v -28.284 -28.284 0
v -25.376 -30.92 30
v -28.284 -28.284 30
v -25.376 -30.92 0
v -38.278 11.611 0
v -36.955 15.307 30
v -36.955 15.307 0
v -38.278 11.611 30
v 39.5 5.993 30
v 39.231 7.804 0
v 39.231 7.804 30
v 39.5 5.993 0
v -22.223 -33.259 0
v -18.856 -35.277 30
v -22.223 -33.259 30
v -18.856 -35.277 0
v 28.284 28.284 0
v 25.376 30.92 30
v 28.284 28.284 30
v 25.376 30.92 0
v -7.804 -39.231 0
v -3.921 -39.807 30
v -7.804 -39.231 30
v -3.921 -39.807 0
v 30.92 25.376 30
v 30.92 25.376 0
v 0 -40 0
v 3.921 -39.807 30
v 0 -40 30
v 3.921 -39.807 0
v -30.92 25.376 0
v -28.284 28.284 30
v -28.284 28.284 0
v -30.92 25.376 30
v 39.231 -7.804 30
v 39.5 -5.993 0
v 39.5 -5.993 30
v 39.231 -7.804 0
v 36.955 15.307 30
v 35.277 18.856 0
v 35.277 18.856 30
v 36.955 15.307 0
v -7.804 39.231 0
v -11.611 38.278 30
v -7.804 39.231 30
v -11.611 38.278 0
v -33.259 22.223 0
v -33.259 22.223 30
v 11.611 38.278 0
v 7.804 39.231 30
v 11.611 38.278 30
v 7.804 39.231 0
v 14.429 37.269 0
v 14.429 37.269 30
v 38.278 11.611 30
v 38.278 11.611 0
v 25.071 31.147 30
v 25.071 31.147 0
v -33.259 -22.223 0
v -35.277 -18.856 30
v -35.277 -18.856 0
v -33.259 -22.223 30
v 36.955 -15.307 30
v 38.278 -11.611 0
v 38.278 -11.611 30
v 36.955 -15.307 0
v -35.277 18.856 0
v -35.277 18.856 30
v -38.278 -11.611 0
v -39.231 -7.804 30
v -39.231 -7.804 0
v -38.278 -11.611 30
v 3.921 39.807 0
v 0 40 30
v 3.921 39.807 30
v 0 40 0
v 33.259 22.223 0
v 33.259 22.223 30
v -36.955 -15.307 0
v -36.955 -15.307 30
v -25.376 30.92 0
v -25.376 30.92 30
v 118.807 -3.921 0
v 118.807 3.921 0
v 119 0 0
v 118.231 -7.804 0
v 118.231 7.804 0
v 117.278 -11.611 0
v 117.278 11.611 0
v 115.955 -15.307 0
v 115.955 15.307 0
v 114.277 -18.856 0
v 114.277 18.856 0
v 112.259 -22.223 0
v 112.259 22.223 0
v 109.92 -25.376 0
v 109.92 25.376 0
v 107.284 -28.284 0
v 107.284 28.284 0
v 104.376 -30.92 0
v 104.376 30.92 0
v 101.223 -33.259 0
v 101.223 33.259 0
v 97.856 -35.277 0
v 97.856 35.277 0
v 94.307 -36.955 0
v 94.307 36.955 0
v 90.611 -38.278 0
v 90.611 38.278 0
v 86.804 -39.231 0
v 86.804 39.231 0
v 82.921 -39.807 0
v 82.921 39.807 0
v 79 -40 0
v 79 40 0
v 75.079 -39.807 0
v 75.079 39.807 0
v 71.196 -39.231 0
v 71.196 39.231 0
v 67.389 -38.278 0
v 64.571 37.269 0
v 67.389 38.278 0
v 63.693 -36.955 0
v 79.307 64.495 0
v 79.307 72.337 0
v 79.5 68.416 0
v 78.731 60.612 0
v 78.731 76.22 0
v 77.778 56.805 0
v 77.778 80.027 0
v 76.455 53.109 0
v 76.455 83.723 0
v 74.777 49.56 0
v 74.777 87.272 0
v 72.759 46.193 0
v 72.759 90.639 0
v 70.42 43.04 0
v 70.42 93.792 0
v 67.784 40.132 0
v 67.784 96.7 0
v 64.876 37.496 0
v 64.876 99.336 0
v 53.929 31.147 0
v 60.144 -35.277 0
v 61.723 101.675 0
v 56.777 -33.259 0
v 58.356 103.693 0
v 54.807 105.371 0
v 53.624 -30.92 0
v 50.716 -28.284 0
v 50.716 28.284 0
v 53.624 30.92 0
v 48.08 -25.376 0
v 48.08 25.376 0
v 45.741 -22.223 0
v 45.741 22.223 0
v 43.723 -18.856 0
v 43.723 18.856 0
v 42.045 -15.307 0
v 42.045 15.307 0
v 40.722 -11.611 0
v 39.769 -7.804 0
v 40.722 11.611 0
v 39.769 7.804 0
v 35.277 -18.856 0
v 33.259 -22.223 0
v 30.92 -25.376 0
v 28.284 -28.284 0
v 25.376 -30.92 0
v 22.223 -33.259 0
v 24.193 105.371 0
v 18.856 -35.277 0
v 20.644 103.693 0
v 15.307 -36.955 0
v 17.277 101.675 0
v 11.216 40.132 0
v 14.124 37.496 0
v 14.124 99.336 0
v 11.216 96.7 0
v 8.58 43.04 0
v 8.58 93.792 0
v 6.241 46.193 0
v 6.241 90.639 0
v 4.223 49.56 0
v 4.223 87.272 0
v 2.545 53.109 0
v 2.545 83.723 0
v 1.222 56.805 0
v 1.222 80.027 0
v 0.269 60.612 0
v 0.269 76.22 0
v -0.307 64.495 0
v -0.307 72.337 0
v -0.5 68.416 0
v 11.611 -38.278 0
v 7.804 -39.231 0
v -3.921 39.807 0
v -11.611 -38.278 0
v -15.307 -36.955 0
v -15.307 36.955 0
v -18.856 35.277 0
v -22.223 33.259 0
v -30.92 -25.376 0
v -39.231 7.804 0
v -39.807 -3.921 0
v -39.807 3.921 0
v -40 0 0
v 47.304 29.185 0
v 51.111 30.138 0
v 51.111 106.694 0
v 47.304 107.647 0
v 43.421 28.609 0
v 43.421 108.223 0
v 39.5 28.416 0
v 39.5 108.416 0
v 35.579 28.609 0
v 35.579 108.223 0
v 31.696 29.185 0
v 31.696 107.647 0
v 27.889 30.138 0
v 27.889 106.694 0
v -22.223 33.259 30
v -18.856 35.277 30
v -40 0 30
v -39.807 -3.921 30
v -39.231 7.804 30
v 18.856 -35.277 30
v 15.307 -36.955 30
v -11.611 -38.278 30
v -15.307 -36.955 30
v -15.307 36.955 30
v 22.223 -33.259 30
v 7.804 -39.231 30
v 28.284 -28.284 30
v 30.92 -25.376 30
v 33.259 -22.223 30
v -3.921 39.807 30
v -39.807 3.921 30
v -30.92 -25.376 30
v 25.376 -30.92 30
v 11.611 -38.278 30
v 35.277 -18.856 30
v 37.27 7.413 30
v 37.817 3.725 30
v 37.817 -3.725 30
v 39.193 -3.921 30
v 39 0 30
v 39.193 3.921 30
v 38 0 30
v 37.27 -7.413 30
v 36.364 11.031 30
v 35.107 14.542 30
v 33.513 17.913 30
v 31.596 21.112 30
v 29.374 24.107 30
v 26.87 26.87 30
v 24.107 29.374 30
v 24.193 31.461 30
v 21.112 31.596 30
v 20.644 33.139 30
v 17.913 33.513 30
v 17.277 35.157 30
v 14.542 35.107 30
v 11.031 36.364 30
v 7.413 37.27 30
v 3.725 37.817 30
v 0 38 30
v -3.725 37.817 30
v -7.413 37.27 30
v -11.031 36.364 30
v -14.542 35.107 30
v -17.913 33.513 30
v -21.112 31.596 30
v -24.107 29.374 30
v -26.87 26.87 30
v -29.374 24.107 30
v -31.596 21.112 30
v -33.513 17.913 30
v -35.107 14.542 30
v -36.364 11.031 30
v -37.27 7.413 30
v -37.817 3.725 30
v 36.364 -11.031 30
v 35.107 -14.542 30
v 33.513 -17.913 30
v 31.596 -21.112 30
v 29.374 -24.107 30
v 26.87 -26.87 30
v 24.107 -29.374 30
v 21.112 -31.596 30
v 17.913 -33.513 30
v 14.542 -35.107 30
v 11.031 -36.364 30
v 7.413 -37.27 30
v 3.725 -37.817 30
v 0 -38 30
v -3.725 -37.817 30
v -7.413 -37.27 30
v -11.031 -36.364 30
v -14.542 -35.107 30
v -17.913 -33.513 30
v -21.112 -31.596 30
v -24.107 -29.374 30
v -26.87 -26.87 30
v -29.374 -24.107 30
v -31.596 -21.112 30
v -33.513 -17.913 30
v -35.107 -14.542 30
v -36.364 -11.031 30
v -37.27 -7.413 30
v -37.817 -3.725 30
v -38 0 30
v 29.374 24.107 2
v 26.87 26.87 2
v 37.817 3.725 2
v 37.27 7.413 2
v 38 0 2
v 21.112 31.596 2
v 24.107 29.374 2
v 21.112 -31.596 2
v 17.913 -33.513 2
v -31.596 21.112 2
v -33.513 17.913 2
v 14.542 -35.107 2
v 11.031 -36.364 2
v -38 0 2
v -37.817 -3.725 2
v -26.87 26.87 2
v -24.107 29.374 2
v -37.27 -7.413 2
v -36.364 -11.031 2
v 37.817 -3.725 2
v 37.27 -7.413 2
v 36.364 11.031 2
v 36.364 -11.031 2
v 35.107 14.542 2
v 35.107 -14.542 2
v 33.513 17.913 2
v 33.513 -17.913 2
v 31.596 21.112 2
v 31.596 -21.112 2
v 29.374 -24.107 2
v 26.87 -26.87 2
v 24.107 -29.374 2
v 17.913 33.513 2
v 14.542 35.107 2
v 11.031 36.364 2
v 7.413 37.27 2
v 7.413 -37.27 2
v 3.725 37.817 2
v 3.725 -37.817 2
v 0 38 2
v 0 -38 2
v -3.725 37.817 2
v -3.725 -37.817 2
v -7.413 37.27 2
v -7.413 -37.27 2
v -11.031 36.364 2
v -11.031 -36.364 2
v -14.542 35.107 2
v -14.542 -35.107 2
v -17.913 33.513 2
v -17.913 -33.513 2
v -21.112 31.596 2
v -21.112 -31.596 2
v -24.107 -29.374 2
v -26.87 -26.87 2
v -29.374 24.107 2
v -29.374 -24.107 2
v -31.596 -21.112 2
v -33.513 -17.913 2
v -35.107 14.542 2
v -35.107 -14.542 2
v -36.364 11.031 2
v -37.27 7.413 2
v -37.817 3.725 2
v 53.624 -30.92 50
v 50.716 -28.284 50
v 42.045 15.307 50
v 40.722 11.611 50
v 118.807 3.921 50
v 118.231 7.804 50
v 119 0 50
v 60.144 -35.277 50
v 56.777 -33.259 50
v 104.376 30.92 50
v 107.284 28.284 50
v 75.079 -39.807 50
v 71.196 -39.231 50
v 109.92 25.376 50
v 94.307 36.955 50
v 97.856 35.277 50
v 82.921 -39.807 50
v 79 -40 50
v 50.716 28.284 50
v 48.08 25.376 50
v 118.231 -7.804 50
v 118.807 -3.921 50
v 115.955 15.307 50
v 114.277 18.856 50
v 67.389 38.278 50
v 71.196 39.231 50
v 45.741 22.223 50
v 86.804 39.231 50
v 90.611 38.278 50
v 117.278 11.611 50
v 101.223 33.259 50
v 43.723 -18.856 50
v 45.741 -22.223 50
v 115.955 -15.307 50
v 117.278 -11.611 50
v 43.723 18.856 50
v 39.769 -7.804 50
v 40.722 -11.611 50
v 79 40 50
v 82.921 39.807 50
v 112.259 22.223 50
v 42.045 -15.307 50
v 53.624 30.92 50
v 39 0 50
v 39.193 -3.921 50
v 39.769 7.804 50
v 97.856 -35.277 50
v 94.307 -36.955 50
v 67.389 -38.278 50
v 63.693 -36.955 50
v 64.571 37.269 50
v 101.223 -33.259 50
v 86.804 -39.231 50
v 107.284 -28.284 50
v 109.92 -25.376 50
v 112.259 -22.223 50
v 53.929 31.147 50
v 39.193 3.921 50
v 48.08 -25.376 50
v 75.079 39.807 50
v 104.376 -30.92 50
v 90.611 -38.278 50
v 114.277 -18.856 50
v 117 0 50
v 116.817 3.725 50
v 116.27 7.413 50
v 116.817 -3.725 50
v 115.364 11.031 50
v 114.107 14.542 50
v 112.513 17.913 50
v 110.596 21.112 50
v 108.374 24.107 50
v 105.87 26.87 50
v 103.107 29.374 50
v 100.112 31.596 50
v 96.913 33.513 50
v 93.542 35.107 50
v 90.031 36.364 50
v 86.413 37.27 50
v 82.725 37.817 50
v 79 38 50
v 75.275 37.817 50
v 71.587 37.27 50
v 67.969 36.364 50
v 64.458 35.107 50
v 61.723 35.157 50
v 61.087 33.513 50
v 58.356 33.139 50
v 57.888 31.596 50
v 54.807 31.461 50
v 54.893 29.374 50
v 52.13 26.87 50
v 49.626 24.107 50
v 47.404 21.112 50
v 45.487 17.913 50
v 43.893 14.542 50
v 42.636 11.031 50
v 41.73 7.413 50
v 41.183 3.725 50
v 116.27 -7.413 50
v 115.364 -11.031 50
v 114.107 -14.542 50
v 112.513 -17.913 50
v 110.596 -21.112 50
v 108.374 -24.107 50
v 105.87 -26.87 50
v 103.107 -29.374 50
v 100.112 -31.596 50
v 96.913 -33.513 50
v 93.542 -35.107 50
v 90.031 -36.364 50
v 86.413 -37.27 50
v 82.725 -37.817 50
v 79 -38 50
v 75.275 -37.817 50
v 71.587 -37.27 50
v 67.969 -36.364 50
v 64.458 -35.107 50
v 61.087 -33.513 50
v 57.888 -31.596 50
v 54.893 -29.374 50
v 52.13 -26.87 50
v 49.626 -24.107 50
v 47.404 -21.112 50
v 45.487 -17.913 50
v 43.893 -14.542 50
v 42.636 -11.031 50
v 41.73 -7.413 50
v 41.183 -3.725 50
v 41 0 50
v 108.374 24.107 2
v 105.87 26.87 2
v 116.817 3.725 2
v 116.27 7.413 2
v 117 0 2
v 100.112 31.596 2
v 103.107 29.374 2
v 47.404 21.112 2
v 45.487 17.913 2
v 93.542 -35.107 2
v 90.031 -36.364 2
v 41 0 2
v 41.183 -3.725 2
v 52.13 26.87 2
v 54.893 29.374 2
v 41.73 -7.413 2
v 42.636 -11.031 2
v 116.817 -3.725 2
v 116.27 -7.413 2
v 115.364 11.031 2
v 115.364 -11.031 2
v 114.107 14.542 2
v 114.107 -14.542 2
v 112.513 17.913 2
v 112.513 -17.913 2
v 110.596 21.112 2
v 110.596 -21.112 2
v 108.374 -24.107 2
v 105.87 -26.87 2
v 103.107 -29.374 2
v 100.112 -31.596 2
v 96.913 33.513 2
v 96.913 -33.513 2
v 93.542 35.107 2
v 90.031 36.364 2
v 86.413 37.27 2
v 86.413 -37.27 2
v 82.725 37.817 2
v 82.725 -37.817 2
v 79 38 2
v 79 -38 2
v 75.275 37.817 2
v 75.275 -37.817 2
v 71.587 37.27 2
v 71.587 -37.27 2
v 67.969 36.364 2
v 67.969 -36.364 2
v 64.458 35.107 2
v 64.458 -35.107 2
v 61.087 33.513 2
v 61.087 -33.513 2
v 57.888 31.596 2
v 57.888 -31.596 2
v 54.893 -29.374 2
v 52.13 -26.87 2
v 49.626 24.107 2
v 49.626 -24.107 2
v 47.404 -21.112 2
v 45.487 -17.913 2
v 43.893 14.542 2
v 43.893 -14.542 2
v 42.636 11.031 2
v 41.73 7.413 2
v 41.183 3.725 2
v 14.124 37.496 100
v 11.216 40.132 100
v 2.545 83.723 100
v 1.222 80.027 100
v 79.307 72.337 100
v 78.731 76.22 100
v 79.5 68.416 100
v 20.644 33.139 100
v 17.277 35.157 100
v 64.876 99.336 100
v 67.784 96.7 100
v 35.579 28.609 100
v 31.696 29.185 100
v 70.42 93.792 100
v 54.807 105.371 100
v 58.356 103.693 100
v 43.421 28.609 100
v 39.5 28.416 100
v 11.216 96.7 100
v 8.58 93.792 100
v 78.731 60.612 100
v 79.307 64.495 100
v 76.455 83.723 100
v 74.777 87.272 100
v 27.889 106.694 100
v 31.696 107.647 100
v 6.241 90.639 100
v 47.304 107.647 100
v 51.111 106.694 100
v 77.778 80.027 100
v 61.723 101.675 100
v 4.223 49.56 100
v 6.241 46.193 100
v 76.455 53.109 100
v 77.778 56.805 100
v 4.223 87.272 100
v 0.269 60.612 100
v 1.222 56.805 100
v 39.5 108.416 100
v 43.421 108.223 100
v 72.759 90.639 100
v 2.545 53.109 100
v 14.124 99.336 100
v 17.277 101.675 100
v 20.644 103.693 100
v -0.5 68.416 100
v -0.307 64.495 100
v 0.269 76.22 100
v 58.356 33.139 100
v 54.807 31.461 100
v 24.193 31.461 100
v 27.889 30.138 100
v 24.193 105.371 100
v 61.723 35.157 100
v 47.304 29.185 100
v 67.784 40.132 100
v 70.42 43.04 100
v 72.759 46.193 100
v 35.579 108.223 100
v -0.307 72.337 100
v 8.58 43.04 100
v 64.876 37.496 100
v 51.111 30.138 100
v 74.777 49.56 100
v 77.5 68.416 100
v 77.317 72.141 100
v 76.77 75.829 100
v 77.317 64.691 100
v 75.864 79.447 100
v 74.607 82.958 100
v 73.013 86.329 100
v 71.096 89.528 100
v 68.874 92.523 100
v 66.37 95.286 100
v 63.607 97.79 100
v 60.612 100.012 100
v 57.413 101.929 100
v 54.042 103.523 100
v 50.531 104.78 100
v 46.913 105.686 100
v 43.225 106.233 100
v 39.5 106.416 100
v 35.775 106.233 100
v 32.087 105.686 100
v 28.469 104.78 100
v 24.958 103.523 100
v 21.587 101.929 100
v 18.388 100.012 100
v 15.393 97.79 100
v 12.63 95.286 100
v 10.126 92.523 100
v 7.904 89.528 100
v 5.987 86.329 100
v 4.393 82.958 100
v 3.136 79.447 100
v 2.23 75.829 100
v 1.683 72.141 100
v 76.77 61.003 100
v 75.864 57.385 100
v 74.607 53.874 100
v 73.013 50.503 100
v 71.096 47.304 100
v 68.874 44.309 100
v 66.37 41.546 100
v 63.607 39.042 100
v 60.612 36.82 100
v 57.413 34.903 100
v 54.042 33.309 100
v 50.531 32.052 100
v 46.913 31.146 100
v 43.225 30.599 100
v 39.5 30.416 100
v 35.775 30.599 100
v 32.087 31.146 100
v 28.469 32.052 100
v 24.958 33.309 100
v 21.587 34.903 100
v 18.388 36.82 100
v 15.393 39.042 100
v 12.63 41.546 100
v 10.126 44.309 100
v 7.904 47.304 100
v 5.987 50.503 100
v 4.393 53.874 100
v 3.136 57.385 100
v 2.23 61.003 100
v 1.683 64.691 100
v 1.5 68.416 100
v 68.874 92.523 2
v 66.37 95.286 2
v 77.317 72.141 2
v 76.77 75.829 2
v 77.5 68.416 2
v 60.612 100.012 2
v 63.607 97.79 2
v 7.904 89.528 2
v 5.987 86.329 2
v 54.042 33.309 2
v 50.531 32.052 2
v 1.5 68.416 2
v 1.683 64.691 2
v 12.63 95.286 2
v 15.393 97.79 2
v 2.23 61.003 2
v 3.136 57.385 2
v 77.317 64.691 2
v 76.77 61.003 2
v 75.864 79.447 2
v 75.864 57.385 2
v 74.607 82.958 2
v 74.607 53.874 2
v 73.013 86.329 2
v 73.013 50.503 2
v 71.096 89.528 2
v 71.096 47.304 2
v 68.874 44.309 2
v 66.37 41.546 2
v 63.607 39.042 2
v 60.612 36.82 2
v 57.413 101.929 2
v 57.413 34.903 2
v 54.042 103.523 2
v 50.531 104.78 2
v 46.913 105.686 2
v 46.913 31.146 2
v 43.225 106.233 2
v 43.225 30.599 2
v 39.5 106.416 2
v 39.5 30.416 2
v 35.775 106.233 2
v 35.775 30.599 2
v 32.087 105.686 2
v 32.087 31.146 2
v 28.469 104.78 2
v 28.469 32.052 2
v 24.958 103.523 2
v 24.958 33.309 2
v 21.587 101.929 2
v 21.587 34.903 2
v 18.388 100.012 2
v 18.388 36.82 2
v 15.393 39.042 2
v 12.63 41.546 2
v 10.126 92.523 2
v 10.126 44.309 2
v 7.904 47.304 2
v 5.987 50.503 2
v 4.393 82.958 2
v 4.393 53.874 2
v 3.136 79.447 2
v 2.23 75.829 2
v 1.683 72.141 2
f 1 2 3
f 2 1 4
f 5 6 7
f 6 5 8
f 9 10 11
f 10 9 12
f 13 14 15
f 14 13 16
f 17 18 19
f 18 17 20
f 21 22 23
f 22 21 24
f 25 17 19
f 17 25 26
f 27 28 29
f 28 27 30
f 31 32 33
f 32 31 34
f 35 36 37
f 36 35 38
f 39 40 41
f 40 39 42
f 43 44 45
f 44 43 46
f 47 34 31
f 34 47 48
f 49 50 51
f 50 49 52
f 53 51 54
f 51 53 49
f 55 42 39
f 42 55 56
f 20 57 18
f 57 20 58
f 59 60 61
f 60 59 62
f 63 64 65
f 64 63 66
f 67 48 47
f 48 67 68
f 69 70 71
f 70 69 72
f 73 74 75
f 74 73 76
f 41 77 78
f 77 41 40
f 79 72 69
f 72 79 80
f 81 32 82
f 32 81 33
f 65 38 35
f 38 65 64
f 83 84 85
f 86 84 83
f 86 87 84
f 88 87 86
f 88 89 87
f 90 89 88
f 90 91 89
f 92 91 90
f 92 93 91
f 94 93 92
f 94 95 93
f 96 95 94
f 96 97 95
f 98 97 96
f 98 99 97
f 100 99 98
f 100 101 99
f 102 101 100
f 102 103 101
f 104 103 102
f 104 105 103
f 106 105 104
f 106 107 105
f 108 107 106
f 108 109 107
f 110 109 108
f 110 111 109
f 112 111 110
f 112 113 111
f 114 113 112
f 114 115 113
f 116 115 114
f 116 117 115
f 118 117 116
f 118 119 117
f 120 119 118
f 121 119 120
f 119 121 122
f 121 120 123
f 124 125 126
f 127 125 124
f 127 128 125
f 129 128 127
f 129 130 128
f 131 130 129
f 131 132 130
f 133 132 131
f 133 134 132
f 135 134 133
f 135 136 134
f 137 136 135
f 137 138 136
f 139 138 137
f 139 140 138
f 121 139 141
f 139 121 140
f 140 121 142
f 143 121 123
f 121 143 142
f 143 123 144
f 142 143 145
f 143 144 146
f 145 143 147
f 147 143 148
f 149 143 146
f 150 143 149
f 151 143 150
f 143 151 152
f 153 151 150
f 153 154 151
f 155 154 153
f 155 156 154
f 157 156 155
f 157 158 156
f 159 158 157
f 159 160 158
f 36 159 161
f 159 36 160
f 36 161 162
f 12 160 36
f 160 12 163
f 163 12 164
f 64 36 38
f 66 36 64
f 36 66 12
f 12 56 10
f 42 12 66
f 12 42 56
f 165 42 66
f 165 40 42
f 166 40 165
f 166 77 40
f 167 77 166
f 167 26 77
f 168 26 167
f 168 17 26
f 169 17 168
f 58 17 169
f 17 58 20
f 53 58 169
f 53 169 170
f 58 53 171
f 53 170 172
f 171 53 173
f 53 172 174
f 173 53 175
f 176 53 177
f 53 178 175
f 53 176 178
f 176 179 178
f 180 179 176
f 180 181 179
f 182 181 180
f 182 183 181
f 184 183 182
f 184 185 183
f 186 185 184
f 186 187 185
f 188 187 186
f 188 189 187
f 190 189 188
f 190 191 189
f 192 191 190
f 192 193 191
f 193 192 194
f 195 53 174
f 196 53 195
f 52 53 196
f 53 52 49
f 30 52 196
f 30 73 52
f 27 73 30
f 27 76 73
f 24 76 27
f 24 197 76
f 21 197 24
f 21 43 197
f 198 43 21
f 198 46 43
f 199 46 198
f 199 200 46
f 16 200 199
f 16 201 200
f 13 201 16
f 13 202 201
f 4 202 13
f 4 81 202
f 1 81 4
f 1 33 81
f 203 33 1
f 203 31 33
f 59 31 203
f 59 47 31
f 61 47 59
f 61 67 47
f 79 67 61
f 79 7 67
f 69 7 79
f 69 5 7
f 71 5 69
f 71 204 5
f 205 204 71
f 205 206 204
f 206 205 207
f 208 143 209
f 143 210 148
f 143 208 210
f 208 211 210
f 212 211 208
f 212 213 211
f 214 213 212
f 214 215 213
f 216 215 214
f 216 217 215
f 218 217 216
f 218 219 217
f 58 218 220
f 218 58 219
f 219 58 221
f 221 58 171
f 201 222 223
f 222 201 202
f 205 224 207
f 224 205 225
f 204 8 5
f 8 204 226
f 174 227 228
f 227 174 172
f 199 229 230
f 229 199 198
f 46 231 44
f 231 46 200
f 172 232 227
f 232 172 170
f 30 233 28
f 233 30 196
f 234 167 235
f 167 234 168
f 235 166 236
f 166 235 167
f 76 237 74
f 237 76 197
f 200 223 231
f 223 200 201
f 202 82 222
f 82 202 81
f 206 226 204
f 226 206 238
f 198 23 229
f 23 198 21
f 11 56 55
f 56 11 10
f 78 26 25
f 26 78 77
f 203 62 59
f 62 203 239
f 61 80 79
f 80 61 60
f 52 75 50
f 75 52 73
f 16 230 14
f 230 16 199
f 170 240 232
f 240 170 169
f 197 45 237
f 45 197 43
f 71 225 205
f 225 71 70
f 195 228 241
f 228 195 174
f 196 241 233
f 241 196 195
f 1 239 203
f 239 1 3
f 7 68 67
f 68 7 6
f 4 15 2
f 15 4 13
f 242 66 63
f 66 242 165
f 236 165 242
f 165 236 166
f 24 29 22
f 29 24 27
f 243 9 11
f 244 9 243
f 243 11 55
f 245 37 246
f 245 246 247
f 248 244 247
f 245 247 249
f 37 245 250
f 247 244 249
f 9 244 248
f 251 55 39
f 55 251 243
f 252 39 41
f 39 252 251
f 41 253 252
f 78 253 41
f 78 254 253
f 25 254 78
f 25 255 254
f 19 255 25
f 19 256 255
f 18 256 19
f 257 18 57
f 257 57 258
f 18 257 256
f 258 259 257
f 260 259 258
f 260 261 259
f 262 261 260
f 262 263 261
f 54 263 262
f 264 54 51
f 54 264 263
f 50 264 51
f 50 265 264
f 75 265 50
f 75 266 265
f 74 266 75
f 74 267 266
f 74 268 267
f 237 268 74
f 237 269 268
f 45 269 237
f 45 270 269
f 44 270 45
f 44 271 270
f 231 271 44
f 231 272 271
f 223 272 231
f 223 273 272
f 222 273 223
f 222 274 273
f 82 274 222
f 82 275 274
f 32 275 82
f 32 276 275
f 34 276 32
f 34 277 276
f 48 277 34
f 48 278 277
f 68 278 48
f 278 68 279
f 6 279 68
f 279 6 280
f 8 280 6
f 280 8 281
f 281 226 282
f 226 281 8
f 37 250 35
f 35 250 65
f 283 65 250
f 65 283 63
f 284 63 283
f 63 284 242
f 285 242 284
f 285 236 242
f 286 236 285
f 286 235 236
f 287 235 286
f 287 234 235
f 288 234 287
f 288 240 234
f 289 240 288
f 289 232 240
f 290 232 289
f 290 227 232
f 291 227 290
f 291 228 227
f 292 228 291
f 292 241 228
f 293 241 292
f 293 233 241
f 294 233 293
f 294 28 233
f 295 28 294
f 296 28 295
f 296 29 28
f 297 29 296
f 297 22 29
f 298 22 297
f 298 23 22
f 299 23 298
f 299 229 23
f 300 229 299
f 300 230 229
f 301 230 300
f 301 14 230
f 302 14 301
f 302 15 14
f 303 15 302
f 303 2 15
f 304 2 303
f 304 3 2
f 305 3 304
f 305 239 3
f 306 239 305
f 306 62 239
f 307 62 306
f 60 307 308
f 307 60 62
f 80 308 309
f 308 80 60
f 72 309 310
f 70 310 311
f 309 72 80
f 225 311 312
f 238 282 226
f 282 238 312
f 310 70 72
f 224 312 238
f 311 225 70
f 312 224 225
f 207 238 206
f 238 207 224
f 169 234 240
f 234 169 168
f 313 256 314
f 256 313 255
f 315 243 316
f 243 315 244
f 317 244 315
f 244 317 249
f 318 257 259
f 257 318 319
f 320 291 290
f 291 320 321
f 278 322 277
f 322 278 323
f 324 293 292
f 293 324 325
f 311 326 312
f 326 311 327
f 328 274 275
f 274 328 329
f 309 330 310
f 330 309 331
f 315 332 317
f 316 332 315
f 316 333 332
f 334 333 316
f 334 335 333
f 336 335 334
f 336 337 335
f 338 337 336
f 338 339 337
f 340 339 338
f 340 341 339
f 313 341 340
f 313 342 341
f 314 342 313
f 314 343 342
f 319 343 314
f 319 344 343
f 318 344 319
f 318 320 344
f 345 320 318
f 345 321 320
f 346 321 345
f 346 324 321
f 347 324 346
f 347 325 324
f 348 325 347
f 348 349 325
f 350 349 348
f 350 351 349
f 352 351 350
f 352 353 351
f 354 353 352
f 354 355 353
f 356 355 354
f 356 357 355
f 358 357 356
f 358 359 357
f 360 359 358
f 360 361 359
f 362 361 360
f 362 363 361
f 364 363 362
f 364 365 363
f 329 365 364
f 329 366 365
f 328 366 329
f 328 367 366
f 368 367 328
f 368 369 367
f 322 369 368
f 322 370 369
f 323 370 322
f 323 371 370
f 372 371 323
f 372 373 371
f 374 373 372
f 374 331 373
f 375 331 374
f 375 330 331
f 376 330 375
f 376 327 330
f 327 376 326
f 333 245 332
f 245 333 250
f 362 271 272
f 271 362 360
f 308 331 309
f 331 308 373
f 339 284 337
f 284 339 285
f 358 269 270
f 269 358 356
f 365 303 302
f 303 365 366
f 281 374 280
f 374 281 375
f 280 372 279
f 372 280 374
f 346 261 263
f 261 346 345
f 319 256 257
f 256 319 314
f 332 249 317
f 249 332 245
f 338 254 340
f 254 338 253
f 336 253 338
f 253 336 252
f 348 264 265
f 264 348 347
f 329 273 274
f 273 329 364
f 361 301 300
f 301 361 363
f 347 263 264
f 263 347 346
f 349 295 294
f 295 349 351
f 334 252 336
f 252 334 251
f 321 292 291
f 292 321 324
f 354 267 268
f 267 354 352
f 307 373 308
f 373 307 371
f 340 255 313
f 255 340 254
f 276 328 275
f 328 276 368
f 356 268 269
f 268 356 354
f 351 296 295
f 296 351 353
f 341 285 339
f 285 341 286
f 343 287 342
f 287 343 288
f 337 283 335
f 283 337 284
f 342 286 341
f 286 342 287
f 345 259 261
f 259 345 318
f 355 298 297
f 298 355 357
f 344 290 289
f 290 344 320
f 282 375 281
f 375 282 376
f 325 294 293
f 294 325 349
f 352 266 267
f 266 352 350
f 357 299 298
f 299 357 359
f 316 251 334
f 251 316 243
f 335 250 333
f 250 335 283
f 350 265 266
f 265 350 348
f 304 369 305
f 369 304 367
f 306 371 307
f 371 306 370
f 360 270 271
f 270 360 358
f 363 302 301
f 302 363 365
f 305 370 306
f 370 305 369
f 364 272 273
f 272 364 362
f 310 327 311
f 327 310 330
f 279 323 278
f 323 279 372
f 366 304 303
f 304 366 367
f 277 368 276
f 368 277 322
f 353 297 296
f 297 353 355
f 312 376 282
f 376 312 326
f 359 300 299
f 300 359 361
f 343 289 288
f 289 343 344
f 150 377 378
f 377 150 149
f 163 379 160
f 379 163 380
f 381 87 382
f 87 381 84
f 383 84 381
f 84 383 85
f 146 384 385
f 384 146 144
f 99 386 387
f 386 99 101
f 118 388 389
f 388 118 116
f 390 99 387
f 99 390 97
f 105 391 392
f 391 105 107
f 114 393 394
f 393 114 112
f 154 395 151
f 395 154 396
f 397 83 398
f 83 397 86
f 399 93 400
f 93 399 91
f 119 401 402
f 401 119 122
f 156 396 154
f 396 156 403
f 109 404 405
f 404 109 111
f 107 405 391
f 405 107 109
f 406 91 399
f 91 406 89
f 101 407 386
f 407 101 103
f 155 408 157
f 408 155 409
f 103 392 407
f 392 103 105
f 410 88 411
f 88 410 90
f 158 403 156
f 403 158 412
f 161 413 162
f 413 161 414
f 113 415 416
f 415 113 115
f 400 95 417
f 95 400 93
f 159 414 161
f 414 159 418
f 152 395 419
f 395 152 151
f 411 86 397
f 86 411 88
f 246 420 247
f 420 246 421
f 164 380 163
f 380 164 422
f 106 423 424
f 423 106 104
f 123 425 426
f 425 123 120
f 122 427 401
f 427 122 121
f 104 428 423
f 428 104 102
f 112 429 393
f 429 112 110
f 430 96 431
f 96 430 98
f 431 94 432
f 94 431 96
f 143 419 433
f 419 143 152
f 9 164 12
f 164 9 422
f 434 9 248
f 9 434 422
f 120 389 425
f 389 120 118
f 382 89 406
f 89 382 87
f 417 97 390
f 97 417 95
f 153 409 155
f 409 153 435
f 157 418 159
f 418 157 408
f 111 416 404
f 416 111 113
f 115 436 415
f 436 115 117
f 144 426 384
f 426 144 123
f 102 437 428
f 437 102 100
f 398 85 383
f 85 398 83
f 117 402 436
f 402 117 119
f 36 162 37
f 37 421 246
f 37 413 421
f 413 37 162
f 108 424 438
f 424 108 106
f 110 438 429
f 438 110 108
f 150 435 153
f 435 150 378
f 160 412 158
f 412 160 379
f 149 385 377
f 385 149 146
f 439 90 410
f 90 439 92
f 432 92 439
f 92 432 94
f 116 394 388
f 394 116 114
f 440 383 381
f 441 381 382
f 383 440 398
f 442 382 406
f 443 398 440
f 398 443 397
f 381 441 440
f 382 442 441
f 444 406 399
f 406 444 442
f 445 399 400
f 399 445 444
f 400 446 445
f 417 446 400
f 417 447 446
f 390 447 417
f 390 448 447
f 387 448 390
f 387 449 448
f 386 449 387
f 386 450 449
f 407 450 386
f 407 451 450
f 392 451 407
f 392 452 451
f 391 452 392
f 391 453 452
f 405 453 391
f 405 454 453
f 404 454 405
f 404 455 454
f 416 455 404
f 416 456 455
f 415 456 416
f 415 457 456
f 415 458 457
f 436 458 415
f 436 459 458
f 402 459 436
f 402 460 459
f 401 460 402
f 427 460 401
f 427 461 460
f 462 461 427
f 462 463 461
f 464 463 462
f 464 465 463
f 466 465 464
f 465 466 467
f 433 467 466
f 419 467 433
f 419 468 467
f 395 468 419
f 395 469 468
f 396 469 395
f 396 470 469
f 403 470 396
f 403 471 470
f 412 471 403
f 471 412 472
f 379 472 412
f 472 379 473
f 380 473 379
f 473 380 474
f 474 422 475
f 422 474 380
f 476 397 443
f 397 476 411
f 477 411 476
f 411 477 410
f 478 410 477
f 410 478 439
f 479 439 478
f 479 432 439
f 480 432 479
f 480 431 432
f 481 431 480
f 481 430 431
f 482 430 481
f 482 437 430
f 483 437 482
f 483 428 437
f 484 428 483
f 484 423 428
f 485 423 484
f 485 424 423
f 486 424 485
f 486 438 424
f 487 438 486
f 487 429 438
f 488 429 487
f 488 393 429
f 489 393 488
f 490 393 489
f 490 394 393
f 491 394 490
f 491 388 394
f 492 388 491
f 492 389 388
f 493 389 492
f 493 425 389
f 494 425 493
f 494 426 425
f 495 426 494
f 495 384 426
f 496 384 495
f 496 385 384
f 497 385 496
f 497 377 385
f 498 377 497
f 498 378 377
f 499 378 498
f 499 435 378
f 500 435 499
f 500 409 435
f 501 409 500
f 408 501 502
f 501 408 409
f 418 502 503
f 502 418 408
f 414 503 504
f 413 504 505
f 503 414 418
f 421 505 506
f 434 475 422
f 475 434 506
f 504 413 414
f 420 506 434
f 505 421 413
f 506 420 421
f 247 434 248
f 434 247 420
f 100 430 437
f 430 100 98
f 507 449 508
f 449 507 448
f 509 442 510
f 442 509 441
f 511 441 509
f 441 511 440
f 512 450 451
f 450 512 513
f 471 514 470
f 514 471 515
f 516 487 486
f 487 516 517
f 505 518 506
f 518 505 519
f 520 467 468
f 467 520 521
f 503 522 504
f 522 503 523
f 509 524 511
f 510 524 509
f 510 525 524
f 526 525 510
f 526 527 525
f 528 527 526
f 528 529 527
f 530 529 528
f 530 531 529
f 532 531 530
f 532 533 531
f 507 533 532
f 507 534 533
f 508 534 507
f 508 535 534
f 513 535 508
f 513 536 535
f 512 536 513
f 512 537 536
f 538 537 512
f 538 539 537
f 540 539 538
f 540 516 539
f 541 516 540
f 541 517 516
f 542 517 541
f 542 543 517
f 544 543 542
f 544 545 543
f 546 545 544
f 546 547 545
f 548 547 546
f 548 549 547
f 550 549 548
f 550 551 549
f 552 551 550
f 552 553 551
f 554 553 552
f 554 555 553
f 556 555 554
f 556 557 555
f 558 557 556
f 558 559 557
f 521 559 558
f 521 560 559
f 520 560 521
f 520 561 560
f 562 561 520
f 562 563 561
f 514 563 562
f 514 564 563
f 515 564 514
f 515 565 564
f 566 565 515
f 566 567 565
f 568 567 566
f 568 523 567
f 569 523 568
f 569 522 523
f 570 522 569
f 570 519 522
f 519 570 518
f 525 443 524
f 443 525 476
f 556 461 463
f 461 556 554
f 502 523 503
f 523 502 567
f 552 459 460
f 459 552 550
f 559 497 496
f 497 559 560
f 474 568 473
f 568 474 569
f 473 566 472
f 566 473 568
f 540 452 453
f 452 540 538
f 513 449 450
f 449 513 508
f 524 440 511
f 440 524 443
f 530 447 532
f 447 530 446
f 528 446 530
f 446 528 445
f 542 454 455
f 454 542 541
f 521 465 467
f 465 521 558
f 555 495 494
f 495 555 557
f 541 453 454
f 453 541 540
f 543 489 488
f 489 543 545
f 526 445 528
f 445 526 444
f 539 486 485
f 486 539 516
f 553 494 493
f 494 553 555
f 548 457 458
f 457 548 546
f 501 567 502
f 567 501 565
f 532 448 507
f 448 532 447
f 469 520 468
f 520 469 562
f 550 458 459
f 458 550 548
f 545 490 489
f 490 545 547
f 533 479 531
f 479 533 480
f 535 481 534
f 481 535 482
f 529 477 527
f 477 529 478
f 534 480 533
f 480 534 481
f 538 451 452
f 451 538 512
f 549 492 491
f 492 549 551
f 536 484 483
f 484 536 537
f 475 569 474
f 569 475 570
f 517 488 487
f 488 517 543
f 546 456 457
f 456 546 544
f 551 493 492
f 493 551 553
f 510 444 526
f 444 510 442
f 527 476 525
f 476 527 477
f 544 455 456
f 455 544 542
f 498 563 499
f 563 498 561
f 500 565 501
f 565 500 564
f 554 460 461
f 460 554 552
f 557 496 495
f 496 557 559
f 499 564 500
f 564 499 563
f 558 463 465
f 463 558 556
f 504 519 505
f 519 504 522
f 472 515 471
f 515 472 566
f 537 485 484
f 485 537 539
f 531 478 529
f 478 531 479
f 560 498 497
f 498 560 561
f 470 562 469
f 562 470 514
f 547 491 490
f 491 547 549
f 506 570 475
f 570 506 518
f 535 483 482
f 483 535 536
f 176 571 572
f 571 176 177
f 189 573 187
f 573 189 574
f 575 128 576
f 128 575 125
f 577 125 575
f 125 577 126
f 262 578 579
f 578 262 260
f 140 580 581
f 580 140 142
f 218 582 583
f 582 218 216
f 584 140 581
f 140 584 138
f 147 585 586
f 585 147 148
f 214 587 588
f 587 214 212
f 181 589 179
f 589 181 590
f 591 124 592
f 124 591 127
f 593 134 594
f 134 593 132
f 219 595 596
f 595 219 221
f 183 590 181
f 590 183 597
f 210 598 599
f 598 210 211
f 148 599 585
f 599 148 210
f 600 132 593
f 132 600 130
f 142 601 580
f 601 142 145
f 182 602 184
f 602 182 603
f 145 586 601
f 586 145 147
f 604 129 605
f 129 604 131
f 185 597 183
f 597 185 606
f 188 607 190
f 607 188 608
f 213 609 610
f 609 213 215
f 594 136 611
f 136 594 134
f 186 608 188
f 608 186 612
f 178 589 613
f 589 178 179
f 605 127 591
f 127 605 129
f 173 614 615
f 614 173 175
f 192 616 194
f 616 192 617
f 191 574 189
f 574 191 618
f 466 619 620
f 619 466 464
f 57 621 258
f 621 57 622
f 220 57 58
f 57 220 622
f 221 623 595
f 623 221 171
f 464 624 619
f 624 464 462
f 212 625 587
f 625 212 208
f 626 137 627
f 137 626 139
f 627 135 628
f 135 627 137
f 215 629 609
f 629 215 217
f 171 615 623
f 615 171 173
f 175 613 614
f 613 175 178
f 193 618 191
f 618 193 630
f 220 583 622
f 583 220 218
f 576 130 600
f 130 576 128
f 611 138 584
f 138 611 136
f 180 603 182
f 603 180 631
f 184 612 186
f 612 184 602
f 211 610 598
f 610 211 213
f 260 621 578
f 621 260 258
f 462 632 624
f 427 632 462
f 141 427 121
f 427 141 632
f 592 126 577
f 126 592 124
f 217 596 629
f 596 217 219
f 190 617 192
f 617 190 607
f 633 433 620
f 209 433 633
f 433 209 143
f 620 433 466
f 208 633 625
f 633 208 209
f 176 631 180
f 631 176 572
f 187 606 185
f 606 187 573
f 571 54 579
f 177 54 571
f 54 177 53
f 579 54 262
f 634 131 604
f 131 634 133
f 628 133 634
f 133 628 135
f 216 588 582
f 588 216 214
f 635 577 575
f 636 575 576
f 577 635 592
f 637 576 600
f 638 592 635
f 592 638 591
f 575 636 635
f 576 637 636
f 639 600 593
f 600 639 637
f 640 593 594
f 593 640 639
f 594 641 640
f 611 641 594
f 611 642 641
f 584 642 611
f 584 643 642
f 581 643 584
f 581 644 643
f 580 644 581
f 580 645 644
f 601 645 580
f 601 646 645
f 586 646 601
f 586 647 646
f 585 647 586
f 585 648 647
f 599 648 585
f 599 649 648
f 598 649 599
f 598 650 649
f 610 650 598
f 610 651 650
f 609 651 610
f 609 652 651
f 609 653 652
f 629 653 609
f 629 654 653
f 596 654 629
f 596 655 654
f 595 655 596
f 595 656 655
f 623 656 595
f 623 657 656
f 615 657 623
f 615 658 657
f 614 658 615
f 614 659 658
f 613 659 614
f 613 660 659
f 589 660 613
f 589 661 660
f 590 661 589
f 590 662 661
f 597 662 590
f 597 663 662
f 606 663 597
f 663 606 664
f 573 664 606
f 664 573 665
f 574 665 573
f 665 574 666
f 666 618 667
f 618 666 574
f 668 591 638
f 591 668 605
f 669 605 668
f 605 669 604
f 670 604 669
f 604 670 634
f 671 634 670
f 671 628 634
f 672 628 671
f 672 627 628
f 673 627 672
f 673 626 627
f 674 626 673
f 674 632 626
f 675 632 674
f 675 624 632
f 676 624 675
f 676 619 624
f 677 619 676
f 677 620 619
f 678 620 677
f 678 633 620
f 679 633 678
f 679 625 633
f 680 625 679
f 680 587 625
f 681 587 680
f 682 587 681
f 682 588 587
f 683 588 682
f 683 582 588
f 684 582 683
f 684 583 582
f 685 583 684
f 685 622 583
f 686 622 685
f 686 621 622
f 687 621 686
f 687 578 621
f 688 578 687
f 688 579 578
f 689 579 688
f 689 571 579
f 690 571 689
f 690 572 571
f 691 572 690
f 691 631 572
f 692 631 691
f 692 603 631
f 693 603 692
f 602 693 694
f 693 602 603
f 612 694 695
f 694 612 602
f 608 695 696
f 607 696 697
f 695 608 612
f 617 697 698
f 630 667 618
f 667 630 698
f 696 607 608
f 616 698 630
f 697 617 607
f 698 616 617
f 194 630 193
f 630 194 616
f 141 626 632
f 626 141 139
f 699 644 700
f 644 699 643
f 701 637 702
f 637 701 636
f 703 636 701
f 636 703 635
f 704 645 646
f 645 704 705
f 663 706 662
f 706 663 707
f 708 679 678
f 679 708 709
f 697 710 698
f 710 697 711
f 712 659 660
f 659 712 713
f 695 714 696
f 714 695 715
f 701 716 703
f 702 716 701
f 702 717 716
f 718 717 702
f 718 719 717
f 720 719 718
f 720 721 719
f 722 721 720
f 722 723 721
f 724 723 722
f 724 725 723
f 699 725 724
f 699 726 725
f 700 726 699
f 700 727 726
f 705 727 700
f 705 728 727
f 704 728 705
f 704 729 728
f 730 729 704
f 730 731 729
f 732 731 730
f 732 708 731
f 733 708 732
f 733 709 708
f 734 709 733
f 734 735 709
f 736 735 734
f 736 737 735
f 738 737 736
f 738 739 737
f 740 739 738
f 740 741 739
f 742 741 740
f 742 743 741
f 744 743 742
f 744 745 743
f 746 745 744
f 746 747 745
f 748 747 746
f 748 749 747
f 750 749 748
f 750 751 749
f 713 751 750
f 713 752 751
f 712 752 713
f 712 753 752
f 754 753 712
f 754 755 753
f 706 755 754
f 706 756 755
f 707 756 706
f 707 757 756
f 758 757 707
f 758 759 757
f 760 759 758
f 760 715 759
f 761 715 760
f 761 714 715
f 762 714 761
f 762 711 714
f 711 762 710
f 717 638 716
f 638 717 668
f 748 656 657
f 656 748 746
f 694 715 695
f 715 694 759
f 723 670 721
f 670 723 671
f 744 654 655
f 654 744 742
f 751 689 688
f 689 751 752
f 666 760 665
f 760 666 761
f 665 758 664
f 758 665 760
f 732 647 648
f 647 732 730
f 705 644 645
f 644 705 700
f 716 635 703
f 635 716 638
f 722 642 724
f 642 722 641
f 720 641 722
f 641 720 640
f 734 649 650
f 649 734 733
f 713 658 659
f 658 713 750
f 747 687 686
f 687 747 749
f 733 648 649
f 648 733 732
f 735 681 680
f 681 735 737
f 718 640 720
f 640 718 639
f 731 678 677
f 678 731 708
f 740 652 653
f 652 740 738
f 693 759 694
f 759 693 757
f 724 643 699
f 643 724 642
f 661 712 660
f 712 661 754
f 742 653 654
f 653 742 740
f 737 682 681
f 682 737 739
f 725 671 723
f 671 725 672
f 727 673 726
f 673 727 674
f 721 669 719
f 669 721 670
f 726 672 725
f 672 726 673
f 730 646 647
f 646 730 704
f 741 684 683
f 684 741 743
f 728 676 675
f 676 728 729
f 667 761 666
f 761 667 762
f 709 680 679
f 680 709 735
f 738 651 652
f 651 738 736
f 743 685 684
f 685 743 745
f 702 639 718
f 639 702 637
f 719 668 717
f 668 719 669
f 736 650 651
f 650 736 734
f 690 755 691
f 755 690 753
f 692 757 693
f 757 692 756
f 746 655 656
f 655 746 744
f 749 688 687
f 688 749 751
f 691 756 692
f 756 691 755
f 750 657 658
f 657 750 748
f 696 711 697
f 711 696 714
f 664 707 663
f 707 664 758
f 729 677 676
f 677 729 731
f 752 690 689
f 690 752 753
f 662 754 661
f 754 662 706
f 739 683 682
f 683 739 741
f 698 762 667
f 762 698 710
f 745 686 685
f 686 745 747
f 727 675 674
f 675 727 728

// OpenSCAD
// Diameter of each of the towers
diameter = 80; // [30:5:100]
// Height of the first tower
height1 = 30; // [30:10:200]
// Height of the second tower
height2 = 50; // [30:10:200]
// Height of the third tower
height3 = 100; // [30:10:200]

PencilHolder(height1, height2, height3);

module Container(height) {
    $fn=64;
    difference() {
        cylinder(h=height, d=diameter);
        translate([0, 0, 2]) cylinder(h=height, d=diameter-4);
    }
}

module PencilHolder(height1 = 100, height2 = 50, height3 = 30) {
    Container(height1);
    translate([diameter-1,0,0]) Container(height2);
    translate([(diameter-1)/2,(diameter-1)*sin(60),0]) Container(height3);
}
